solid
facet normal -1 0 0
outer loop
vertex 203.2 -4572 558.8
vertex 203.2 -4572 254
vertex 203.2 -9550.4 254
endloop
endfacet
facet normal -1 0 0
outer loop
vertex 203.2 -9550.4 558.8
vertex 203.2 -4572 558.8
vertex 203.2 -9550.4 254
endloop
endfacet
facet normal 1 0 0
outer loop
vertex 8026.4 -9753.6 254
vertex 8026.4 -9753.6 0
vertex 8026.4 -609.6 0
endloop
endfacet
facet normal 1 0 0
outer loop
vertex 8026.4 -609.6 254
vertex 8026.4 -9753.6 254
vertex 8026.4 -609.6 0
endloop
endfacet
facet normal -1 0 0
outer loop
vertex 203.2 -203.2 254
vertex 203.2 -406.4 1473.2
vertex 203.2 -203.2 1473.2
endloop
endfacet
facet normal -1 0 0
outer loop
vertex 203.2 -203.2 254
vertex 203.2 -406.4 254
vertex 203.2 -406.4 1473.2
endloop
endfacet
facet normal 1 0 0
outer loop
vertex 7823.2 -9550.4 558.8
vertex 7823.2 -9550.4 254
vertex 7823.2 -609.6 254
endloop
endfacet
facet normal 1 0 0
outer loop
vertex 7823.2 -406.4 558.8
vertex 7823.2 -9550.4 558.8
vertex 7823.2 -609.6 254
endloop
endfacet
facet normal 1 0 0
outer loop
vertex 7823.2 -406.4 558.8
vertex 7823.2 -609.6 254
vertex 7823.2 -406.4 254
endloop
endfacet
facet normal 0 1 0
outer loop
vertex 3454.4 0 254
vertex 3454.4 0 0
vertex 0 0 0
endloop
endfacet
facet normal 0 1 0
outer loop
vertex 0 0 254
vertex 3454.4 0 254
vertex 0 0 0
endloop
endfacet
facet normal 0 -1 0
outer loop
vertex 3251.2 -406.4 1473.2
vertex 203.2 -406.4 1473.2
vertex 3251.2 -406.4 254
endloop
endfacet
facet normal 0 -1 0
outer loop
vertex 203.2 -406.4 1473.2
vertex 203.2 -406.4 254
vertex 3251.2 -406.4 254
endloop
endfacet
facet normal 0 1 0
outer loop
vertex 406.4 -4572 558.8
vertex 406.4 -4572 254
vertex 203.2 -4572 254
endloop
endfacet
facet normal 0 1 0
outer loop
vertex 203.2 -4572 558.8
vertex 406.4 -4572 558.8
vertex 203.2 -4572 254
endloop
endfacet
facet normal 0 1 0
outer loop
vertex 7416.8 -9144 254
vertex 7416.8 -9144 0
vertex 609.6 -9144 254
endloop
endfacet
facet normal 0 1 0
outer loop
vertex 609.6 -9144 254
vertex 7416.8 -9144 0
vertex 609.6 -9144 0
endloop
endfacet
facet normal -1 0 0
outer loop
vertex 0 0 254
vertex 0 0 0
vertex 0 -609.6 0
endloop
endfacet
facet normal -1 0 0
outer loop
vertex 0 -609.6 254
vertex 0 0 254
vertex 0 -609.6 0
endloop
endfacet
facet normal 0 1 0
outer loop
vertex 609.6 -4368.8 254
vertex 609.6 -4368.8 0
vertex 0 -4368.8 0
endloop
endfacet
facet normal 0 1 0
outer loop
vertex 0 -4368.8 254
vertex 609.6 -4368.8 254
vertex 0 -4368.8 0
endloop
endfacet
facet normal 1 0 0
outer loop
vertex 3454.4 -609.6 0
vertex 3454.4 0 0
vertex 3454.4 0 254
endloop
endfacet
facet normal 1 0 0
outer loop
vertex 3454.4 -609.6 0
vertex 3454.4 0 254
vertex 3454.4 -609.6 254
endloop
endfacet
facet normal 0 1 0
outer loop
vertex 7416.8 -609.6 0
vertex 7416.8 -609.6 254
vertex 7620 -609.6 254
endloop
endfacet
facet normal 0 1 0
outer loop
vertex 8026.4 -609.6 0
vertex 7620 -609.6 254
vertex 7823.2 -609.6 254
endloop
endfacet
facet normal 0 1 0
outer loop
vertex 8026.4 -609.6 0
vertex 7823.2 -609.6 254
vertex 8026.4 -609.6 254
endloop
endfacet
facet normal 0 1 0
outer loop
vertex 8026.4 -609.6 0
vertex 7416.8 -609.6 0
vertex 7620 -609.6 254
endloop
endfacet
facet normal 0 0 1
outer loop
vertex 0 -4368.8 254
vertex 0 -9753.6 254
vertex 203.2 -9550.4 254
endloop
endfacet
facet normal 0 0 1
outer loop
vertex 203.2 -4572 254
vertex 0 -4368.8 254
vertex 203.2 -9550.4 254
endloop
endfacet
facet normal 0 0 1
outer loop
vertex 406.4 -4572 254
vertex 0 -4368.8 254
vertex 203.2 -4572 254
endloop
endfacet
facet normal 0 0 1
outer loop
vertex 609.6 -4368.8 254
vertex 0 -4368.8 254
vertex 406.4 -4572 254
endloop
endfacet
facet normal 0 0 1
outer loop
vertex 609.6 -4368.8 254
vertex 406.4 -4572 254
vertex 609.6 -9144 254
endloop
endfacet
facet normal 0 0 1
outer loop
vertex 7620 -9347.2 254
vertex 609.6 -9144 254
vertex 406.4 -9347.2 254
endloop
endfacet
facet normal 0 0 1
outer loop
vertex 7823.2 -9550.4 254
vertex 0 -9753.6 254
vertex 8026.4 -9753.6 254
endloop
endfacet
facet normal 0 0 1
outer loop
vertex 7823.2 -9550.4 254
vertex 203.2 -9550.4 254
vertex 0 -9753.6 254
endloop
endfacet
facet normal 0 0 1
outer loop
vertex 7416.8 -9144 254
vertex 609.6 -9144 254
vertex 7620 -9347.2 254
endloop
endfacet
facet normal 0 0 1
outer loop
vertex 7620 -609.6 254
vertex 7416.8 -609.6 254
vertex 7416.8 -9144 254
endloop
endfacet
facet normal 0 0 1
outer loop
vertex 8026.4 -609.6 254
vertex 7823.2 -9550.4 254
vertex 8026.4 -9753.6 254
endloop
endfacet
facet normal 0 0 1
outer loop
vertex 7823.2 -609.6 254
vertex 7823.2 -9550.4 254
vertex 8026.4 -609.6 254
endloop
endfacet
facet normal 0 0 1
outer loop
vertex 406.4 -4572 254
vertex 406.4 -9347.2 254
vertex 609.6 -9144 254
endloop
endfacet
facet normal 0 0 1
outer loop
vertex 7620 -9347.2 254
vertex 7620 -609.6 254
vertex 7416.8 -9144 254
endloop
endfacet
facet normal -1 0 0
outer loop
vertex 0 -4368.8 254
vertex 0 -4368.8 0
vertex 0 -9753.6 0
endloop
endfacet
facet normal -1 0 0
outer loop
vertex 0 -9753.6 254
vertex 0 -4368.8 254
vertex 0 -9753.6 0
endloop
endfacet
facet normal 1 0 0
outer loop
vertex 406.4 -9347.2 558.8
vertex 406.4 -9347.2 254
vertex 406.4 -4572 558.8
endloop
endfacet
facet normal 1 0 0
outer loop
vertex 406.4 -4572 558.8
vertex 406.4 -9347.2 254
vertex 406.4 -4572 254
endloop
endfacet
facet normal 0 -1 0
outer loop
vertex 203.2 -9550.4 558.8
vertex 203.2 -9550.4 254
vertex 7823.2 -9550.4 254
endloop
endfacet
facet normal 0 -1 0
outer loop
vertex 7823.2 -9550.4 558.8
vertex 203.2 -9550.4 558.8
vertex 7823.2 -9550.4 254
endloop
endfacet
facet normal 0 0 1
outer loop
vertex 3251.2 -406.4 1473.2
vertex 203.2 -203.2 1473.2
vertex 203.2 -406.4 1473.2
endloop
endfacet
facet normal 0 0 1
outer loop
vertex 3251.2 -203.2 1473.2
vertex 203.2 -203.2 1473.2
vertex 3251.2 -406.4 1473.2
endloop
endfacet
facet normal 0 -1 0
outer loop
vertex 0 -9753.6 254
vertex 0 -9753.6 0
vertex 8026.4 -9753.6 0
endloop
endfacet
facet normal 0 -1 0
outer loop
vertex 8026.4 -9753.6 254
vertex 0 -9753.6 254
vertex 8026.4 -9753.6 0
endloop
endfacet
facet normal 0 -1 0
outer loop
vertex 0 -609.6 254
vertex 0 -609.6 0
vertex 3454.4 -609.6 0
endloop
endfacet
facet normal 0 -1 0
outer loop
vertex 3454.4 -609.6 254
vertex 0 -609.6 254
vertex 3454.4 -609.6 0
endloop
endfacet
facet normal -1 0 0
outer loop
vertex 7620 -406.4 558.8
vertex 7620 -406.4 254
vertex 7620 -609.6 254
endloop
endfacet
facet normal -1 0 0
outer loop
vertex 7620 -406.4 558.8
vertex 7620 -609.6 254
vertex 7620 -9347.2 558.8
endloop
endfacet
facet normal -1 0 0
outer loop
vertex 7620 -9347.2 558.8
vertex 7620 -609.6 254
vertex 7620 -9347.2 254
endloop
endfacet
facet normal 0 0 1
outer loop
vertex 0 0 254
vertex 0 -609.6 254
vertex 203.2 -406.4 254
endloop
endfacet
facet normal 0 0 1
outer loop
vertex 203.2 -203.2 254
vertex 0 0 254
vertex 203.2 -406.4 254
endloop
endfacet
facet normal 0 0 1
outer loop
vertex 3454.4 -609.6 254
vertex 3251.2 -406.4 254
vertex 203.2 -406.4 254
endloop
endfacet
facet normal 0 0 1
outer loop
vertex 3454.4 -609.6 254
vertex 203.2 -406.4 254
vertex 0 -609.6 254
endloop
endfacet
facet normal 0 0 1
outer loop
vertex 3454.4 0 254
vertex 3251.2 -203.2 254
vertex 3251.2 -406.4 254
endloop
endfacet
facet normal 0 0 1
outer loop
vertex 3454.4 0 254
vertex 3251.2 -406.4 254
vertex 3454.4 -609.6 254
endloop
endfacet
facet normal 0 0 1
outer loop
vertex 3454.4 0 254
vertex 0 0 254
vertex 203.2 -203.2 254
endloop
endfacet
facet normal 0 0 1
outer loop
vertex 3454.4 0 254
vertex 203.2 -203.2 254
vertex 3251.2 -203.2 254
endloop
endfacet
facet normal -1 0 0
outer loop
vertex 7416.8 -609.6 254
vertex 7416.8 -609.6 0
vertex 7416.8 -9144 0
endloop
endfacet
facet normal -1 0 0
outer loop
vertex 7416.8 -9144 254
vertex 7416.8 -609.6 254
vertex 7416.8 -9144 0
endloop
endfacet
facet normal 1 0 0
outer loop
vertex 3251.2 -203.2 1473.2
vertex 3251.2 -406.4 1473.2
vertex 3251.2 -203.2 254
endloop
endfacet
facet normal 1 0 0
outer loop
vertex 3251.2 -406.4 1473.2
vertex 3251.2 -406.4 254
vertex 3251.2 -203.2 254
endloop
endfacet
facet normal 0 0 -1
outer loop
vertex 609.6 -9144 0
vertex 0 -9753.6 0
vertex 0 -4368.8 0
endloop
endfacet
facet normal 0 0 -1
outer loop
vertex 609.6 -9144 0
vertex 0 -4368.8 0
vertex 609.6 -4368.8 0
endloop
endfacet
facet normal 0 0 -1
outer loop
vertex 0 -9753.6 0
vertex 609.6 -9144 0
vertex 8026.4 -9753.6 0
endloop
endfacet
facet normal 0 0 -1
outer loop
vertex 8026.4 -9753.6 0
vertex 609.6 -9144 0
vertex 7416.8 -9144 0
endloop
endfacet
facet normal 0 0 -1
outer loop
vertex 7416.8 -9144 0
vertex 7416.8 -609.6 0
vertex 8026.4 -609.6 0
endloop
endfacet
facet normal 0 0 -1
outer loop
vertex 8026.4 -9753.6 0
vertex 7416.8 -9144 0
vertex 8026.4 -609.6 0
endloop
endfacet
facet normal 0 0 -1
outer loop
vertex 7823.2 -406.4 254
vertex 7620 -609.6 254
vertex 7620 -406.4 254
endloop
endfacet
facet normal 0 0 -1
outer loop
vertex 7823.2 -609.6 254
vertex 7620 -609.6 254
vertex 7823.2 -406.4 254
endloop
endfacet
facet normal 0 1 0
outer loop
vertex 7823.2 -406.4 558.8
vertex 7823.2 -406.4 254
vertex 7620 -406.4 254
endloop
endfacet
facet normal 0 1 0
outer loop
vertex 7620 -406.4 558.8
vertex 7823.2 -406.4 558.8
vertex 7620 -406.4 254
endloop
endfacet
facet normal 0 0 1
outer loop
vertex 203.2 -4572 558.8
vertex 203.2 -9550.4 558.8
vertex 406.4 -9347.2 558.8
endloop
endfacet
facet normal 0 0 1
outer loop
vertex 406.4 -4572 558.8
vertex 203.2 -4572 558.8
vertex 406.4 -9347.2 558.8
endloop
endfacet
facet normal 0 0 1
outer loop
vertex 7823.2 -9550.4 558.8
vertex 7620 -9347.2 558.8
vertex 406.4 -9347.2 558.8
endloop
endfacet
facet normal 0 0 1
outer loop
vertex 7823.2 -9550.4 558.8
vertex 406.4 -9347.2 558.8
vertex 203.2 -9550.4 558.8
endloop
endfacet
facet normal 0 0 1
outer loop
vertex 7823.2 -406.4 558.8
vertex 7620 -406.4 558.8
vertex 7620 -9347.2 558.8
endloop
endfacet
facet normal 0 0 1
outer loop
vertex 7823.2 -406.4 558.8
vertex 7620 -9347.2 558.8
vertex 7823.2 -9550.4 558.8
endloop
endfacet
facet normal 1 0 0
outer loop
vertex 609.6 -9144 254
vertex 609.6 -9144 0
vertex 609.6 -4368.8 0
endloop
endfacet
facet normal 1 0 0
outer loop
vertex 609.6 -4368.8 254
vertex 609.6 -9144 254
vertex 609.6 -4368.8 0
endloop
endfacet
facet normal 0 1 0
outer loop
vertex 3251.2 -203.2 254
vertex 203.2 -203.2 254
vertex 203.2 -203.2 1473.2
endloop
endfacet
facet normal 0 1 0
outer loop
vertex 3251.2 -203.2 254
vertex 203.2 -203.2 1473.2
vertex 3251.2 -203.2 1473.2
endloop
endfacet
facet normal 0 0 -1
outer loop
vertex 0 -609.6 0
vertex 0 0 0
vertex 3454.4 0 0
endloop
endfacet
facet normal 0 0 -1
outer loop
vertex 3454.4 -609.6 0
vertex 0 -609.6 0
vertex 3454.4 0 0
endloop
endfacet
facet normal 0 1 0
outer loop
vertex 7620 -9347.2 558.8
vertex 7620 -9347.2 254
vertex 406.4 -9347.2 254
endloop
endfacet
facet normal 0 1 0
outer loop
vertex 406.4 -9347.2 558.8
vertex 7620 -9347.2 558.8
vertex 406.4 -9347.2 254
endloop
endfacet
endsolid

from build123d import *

# Parameters (mm, degrees)
F1_DEPTH = 254
F2_W     = 3048
F2_H     = 203.2
F3_DEPTH = 304.8
F4_W     = 3048
F4_H     = 203.2
F5_DEPTH = 914.4
F6_W     = 4572
F6_H     = 609.6
F7_DEPTH = 254


with BuildPart() as f1:
    # F0 (on Top) → F1 (new body)
    with BuildSketch(Plane.XY):
        Polygon((8026.4, 0), (0, 0), (0, -609.6), (7416.8, -609.6), (7416.8, -9144), (609.6, -9144), (609.6, -4368.8), (0, -4368.8), (0, -9753.6), (8026.4, -9753.6), align=None)
    extrude(amount=F1_DEPTH)

    # F2 (on face) → F3 (join)
    with BuildSketch(Plane.XY.offset(254)):
        with Locations((1727.2, -304.8)):
            Rectangle(F2_W, F2_H)
        Polygon((7823.2, -406.4), (7620, -406.4), (7620, -9347.2), (406.4, -9347.2), (406.4, -4572), (203.2, -4572), (203.2, -9550.4), (7823.2, -9550.4), align=None)
    extrude(amount=F3_DEPTH)

    # F4 (on face) → F5 (join)
    with BuildSketch(Plane.XY.offset(558.8)):
        with Locations((1727.2, -304.8)):
            Rectangle(F4_W, F4_H)
    extrude(amount=F5_DEPTH)

    # F6 (on face) → F7 (cut)
    with BuildSketch(Plane(origin=(0, 0, 0), x_dir=(1, 0, 0), z_dir=(0, 0, -1))):
        with Locations((5740.4, 304.8)):
            Rectangle(F6_W, F6_H)
    extrude(amount=-F7_DEPTH, mode=Mode.SUBTRACT)


solid = f1.part
